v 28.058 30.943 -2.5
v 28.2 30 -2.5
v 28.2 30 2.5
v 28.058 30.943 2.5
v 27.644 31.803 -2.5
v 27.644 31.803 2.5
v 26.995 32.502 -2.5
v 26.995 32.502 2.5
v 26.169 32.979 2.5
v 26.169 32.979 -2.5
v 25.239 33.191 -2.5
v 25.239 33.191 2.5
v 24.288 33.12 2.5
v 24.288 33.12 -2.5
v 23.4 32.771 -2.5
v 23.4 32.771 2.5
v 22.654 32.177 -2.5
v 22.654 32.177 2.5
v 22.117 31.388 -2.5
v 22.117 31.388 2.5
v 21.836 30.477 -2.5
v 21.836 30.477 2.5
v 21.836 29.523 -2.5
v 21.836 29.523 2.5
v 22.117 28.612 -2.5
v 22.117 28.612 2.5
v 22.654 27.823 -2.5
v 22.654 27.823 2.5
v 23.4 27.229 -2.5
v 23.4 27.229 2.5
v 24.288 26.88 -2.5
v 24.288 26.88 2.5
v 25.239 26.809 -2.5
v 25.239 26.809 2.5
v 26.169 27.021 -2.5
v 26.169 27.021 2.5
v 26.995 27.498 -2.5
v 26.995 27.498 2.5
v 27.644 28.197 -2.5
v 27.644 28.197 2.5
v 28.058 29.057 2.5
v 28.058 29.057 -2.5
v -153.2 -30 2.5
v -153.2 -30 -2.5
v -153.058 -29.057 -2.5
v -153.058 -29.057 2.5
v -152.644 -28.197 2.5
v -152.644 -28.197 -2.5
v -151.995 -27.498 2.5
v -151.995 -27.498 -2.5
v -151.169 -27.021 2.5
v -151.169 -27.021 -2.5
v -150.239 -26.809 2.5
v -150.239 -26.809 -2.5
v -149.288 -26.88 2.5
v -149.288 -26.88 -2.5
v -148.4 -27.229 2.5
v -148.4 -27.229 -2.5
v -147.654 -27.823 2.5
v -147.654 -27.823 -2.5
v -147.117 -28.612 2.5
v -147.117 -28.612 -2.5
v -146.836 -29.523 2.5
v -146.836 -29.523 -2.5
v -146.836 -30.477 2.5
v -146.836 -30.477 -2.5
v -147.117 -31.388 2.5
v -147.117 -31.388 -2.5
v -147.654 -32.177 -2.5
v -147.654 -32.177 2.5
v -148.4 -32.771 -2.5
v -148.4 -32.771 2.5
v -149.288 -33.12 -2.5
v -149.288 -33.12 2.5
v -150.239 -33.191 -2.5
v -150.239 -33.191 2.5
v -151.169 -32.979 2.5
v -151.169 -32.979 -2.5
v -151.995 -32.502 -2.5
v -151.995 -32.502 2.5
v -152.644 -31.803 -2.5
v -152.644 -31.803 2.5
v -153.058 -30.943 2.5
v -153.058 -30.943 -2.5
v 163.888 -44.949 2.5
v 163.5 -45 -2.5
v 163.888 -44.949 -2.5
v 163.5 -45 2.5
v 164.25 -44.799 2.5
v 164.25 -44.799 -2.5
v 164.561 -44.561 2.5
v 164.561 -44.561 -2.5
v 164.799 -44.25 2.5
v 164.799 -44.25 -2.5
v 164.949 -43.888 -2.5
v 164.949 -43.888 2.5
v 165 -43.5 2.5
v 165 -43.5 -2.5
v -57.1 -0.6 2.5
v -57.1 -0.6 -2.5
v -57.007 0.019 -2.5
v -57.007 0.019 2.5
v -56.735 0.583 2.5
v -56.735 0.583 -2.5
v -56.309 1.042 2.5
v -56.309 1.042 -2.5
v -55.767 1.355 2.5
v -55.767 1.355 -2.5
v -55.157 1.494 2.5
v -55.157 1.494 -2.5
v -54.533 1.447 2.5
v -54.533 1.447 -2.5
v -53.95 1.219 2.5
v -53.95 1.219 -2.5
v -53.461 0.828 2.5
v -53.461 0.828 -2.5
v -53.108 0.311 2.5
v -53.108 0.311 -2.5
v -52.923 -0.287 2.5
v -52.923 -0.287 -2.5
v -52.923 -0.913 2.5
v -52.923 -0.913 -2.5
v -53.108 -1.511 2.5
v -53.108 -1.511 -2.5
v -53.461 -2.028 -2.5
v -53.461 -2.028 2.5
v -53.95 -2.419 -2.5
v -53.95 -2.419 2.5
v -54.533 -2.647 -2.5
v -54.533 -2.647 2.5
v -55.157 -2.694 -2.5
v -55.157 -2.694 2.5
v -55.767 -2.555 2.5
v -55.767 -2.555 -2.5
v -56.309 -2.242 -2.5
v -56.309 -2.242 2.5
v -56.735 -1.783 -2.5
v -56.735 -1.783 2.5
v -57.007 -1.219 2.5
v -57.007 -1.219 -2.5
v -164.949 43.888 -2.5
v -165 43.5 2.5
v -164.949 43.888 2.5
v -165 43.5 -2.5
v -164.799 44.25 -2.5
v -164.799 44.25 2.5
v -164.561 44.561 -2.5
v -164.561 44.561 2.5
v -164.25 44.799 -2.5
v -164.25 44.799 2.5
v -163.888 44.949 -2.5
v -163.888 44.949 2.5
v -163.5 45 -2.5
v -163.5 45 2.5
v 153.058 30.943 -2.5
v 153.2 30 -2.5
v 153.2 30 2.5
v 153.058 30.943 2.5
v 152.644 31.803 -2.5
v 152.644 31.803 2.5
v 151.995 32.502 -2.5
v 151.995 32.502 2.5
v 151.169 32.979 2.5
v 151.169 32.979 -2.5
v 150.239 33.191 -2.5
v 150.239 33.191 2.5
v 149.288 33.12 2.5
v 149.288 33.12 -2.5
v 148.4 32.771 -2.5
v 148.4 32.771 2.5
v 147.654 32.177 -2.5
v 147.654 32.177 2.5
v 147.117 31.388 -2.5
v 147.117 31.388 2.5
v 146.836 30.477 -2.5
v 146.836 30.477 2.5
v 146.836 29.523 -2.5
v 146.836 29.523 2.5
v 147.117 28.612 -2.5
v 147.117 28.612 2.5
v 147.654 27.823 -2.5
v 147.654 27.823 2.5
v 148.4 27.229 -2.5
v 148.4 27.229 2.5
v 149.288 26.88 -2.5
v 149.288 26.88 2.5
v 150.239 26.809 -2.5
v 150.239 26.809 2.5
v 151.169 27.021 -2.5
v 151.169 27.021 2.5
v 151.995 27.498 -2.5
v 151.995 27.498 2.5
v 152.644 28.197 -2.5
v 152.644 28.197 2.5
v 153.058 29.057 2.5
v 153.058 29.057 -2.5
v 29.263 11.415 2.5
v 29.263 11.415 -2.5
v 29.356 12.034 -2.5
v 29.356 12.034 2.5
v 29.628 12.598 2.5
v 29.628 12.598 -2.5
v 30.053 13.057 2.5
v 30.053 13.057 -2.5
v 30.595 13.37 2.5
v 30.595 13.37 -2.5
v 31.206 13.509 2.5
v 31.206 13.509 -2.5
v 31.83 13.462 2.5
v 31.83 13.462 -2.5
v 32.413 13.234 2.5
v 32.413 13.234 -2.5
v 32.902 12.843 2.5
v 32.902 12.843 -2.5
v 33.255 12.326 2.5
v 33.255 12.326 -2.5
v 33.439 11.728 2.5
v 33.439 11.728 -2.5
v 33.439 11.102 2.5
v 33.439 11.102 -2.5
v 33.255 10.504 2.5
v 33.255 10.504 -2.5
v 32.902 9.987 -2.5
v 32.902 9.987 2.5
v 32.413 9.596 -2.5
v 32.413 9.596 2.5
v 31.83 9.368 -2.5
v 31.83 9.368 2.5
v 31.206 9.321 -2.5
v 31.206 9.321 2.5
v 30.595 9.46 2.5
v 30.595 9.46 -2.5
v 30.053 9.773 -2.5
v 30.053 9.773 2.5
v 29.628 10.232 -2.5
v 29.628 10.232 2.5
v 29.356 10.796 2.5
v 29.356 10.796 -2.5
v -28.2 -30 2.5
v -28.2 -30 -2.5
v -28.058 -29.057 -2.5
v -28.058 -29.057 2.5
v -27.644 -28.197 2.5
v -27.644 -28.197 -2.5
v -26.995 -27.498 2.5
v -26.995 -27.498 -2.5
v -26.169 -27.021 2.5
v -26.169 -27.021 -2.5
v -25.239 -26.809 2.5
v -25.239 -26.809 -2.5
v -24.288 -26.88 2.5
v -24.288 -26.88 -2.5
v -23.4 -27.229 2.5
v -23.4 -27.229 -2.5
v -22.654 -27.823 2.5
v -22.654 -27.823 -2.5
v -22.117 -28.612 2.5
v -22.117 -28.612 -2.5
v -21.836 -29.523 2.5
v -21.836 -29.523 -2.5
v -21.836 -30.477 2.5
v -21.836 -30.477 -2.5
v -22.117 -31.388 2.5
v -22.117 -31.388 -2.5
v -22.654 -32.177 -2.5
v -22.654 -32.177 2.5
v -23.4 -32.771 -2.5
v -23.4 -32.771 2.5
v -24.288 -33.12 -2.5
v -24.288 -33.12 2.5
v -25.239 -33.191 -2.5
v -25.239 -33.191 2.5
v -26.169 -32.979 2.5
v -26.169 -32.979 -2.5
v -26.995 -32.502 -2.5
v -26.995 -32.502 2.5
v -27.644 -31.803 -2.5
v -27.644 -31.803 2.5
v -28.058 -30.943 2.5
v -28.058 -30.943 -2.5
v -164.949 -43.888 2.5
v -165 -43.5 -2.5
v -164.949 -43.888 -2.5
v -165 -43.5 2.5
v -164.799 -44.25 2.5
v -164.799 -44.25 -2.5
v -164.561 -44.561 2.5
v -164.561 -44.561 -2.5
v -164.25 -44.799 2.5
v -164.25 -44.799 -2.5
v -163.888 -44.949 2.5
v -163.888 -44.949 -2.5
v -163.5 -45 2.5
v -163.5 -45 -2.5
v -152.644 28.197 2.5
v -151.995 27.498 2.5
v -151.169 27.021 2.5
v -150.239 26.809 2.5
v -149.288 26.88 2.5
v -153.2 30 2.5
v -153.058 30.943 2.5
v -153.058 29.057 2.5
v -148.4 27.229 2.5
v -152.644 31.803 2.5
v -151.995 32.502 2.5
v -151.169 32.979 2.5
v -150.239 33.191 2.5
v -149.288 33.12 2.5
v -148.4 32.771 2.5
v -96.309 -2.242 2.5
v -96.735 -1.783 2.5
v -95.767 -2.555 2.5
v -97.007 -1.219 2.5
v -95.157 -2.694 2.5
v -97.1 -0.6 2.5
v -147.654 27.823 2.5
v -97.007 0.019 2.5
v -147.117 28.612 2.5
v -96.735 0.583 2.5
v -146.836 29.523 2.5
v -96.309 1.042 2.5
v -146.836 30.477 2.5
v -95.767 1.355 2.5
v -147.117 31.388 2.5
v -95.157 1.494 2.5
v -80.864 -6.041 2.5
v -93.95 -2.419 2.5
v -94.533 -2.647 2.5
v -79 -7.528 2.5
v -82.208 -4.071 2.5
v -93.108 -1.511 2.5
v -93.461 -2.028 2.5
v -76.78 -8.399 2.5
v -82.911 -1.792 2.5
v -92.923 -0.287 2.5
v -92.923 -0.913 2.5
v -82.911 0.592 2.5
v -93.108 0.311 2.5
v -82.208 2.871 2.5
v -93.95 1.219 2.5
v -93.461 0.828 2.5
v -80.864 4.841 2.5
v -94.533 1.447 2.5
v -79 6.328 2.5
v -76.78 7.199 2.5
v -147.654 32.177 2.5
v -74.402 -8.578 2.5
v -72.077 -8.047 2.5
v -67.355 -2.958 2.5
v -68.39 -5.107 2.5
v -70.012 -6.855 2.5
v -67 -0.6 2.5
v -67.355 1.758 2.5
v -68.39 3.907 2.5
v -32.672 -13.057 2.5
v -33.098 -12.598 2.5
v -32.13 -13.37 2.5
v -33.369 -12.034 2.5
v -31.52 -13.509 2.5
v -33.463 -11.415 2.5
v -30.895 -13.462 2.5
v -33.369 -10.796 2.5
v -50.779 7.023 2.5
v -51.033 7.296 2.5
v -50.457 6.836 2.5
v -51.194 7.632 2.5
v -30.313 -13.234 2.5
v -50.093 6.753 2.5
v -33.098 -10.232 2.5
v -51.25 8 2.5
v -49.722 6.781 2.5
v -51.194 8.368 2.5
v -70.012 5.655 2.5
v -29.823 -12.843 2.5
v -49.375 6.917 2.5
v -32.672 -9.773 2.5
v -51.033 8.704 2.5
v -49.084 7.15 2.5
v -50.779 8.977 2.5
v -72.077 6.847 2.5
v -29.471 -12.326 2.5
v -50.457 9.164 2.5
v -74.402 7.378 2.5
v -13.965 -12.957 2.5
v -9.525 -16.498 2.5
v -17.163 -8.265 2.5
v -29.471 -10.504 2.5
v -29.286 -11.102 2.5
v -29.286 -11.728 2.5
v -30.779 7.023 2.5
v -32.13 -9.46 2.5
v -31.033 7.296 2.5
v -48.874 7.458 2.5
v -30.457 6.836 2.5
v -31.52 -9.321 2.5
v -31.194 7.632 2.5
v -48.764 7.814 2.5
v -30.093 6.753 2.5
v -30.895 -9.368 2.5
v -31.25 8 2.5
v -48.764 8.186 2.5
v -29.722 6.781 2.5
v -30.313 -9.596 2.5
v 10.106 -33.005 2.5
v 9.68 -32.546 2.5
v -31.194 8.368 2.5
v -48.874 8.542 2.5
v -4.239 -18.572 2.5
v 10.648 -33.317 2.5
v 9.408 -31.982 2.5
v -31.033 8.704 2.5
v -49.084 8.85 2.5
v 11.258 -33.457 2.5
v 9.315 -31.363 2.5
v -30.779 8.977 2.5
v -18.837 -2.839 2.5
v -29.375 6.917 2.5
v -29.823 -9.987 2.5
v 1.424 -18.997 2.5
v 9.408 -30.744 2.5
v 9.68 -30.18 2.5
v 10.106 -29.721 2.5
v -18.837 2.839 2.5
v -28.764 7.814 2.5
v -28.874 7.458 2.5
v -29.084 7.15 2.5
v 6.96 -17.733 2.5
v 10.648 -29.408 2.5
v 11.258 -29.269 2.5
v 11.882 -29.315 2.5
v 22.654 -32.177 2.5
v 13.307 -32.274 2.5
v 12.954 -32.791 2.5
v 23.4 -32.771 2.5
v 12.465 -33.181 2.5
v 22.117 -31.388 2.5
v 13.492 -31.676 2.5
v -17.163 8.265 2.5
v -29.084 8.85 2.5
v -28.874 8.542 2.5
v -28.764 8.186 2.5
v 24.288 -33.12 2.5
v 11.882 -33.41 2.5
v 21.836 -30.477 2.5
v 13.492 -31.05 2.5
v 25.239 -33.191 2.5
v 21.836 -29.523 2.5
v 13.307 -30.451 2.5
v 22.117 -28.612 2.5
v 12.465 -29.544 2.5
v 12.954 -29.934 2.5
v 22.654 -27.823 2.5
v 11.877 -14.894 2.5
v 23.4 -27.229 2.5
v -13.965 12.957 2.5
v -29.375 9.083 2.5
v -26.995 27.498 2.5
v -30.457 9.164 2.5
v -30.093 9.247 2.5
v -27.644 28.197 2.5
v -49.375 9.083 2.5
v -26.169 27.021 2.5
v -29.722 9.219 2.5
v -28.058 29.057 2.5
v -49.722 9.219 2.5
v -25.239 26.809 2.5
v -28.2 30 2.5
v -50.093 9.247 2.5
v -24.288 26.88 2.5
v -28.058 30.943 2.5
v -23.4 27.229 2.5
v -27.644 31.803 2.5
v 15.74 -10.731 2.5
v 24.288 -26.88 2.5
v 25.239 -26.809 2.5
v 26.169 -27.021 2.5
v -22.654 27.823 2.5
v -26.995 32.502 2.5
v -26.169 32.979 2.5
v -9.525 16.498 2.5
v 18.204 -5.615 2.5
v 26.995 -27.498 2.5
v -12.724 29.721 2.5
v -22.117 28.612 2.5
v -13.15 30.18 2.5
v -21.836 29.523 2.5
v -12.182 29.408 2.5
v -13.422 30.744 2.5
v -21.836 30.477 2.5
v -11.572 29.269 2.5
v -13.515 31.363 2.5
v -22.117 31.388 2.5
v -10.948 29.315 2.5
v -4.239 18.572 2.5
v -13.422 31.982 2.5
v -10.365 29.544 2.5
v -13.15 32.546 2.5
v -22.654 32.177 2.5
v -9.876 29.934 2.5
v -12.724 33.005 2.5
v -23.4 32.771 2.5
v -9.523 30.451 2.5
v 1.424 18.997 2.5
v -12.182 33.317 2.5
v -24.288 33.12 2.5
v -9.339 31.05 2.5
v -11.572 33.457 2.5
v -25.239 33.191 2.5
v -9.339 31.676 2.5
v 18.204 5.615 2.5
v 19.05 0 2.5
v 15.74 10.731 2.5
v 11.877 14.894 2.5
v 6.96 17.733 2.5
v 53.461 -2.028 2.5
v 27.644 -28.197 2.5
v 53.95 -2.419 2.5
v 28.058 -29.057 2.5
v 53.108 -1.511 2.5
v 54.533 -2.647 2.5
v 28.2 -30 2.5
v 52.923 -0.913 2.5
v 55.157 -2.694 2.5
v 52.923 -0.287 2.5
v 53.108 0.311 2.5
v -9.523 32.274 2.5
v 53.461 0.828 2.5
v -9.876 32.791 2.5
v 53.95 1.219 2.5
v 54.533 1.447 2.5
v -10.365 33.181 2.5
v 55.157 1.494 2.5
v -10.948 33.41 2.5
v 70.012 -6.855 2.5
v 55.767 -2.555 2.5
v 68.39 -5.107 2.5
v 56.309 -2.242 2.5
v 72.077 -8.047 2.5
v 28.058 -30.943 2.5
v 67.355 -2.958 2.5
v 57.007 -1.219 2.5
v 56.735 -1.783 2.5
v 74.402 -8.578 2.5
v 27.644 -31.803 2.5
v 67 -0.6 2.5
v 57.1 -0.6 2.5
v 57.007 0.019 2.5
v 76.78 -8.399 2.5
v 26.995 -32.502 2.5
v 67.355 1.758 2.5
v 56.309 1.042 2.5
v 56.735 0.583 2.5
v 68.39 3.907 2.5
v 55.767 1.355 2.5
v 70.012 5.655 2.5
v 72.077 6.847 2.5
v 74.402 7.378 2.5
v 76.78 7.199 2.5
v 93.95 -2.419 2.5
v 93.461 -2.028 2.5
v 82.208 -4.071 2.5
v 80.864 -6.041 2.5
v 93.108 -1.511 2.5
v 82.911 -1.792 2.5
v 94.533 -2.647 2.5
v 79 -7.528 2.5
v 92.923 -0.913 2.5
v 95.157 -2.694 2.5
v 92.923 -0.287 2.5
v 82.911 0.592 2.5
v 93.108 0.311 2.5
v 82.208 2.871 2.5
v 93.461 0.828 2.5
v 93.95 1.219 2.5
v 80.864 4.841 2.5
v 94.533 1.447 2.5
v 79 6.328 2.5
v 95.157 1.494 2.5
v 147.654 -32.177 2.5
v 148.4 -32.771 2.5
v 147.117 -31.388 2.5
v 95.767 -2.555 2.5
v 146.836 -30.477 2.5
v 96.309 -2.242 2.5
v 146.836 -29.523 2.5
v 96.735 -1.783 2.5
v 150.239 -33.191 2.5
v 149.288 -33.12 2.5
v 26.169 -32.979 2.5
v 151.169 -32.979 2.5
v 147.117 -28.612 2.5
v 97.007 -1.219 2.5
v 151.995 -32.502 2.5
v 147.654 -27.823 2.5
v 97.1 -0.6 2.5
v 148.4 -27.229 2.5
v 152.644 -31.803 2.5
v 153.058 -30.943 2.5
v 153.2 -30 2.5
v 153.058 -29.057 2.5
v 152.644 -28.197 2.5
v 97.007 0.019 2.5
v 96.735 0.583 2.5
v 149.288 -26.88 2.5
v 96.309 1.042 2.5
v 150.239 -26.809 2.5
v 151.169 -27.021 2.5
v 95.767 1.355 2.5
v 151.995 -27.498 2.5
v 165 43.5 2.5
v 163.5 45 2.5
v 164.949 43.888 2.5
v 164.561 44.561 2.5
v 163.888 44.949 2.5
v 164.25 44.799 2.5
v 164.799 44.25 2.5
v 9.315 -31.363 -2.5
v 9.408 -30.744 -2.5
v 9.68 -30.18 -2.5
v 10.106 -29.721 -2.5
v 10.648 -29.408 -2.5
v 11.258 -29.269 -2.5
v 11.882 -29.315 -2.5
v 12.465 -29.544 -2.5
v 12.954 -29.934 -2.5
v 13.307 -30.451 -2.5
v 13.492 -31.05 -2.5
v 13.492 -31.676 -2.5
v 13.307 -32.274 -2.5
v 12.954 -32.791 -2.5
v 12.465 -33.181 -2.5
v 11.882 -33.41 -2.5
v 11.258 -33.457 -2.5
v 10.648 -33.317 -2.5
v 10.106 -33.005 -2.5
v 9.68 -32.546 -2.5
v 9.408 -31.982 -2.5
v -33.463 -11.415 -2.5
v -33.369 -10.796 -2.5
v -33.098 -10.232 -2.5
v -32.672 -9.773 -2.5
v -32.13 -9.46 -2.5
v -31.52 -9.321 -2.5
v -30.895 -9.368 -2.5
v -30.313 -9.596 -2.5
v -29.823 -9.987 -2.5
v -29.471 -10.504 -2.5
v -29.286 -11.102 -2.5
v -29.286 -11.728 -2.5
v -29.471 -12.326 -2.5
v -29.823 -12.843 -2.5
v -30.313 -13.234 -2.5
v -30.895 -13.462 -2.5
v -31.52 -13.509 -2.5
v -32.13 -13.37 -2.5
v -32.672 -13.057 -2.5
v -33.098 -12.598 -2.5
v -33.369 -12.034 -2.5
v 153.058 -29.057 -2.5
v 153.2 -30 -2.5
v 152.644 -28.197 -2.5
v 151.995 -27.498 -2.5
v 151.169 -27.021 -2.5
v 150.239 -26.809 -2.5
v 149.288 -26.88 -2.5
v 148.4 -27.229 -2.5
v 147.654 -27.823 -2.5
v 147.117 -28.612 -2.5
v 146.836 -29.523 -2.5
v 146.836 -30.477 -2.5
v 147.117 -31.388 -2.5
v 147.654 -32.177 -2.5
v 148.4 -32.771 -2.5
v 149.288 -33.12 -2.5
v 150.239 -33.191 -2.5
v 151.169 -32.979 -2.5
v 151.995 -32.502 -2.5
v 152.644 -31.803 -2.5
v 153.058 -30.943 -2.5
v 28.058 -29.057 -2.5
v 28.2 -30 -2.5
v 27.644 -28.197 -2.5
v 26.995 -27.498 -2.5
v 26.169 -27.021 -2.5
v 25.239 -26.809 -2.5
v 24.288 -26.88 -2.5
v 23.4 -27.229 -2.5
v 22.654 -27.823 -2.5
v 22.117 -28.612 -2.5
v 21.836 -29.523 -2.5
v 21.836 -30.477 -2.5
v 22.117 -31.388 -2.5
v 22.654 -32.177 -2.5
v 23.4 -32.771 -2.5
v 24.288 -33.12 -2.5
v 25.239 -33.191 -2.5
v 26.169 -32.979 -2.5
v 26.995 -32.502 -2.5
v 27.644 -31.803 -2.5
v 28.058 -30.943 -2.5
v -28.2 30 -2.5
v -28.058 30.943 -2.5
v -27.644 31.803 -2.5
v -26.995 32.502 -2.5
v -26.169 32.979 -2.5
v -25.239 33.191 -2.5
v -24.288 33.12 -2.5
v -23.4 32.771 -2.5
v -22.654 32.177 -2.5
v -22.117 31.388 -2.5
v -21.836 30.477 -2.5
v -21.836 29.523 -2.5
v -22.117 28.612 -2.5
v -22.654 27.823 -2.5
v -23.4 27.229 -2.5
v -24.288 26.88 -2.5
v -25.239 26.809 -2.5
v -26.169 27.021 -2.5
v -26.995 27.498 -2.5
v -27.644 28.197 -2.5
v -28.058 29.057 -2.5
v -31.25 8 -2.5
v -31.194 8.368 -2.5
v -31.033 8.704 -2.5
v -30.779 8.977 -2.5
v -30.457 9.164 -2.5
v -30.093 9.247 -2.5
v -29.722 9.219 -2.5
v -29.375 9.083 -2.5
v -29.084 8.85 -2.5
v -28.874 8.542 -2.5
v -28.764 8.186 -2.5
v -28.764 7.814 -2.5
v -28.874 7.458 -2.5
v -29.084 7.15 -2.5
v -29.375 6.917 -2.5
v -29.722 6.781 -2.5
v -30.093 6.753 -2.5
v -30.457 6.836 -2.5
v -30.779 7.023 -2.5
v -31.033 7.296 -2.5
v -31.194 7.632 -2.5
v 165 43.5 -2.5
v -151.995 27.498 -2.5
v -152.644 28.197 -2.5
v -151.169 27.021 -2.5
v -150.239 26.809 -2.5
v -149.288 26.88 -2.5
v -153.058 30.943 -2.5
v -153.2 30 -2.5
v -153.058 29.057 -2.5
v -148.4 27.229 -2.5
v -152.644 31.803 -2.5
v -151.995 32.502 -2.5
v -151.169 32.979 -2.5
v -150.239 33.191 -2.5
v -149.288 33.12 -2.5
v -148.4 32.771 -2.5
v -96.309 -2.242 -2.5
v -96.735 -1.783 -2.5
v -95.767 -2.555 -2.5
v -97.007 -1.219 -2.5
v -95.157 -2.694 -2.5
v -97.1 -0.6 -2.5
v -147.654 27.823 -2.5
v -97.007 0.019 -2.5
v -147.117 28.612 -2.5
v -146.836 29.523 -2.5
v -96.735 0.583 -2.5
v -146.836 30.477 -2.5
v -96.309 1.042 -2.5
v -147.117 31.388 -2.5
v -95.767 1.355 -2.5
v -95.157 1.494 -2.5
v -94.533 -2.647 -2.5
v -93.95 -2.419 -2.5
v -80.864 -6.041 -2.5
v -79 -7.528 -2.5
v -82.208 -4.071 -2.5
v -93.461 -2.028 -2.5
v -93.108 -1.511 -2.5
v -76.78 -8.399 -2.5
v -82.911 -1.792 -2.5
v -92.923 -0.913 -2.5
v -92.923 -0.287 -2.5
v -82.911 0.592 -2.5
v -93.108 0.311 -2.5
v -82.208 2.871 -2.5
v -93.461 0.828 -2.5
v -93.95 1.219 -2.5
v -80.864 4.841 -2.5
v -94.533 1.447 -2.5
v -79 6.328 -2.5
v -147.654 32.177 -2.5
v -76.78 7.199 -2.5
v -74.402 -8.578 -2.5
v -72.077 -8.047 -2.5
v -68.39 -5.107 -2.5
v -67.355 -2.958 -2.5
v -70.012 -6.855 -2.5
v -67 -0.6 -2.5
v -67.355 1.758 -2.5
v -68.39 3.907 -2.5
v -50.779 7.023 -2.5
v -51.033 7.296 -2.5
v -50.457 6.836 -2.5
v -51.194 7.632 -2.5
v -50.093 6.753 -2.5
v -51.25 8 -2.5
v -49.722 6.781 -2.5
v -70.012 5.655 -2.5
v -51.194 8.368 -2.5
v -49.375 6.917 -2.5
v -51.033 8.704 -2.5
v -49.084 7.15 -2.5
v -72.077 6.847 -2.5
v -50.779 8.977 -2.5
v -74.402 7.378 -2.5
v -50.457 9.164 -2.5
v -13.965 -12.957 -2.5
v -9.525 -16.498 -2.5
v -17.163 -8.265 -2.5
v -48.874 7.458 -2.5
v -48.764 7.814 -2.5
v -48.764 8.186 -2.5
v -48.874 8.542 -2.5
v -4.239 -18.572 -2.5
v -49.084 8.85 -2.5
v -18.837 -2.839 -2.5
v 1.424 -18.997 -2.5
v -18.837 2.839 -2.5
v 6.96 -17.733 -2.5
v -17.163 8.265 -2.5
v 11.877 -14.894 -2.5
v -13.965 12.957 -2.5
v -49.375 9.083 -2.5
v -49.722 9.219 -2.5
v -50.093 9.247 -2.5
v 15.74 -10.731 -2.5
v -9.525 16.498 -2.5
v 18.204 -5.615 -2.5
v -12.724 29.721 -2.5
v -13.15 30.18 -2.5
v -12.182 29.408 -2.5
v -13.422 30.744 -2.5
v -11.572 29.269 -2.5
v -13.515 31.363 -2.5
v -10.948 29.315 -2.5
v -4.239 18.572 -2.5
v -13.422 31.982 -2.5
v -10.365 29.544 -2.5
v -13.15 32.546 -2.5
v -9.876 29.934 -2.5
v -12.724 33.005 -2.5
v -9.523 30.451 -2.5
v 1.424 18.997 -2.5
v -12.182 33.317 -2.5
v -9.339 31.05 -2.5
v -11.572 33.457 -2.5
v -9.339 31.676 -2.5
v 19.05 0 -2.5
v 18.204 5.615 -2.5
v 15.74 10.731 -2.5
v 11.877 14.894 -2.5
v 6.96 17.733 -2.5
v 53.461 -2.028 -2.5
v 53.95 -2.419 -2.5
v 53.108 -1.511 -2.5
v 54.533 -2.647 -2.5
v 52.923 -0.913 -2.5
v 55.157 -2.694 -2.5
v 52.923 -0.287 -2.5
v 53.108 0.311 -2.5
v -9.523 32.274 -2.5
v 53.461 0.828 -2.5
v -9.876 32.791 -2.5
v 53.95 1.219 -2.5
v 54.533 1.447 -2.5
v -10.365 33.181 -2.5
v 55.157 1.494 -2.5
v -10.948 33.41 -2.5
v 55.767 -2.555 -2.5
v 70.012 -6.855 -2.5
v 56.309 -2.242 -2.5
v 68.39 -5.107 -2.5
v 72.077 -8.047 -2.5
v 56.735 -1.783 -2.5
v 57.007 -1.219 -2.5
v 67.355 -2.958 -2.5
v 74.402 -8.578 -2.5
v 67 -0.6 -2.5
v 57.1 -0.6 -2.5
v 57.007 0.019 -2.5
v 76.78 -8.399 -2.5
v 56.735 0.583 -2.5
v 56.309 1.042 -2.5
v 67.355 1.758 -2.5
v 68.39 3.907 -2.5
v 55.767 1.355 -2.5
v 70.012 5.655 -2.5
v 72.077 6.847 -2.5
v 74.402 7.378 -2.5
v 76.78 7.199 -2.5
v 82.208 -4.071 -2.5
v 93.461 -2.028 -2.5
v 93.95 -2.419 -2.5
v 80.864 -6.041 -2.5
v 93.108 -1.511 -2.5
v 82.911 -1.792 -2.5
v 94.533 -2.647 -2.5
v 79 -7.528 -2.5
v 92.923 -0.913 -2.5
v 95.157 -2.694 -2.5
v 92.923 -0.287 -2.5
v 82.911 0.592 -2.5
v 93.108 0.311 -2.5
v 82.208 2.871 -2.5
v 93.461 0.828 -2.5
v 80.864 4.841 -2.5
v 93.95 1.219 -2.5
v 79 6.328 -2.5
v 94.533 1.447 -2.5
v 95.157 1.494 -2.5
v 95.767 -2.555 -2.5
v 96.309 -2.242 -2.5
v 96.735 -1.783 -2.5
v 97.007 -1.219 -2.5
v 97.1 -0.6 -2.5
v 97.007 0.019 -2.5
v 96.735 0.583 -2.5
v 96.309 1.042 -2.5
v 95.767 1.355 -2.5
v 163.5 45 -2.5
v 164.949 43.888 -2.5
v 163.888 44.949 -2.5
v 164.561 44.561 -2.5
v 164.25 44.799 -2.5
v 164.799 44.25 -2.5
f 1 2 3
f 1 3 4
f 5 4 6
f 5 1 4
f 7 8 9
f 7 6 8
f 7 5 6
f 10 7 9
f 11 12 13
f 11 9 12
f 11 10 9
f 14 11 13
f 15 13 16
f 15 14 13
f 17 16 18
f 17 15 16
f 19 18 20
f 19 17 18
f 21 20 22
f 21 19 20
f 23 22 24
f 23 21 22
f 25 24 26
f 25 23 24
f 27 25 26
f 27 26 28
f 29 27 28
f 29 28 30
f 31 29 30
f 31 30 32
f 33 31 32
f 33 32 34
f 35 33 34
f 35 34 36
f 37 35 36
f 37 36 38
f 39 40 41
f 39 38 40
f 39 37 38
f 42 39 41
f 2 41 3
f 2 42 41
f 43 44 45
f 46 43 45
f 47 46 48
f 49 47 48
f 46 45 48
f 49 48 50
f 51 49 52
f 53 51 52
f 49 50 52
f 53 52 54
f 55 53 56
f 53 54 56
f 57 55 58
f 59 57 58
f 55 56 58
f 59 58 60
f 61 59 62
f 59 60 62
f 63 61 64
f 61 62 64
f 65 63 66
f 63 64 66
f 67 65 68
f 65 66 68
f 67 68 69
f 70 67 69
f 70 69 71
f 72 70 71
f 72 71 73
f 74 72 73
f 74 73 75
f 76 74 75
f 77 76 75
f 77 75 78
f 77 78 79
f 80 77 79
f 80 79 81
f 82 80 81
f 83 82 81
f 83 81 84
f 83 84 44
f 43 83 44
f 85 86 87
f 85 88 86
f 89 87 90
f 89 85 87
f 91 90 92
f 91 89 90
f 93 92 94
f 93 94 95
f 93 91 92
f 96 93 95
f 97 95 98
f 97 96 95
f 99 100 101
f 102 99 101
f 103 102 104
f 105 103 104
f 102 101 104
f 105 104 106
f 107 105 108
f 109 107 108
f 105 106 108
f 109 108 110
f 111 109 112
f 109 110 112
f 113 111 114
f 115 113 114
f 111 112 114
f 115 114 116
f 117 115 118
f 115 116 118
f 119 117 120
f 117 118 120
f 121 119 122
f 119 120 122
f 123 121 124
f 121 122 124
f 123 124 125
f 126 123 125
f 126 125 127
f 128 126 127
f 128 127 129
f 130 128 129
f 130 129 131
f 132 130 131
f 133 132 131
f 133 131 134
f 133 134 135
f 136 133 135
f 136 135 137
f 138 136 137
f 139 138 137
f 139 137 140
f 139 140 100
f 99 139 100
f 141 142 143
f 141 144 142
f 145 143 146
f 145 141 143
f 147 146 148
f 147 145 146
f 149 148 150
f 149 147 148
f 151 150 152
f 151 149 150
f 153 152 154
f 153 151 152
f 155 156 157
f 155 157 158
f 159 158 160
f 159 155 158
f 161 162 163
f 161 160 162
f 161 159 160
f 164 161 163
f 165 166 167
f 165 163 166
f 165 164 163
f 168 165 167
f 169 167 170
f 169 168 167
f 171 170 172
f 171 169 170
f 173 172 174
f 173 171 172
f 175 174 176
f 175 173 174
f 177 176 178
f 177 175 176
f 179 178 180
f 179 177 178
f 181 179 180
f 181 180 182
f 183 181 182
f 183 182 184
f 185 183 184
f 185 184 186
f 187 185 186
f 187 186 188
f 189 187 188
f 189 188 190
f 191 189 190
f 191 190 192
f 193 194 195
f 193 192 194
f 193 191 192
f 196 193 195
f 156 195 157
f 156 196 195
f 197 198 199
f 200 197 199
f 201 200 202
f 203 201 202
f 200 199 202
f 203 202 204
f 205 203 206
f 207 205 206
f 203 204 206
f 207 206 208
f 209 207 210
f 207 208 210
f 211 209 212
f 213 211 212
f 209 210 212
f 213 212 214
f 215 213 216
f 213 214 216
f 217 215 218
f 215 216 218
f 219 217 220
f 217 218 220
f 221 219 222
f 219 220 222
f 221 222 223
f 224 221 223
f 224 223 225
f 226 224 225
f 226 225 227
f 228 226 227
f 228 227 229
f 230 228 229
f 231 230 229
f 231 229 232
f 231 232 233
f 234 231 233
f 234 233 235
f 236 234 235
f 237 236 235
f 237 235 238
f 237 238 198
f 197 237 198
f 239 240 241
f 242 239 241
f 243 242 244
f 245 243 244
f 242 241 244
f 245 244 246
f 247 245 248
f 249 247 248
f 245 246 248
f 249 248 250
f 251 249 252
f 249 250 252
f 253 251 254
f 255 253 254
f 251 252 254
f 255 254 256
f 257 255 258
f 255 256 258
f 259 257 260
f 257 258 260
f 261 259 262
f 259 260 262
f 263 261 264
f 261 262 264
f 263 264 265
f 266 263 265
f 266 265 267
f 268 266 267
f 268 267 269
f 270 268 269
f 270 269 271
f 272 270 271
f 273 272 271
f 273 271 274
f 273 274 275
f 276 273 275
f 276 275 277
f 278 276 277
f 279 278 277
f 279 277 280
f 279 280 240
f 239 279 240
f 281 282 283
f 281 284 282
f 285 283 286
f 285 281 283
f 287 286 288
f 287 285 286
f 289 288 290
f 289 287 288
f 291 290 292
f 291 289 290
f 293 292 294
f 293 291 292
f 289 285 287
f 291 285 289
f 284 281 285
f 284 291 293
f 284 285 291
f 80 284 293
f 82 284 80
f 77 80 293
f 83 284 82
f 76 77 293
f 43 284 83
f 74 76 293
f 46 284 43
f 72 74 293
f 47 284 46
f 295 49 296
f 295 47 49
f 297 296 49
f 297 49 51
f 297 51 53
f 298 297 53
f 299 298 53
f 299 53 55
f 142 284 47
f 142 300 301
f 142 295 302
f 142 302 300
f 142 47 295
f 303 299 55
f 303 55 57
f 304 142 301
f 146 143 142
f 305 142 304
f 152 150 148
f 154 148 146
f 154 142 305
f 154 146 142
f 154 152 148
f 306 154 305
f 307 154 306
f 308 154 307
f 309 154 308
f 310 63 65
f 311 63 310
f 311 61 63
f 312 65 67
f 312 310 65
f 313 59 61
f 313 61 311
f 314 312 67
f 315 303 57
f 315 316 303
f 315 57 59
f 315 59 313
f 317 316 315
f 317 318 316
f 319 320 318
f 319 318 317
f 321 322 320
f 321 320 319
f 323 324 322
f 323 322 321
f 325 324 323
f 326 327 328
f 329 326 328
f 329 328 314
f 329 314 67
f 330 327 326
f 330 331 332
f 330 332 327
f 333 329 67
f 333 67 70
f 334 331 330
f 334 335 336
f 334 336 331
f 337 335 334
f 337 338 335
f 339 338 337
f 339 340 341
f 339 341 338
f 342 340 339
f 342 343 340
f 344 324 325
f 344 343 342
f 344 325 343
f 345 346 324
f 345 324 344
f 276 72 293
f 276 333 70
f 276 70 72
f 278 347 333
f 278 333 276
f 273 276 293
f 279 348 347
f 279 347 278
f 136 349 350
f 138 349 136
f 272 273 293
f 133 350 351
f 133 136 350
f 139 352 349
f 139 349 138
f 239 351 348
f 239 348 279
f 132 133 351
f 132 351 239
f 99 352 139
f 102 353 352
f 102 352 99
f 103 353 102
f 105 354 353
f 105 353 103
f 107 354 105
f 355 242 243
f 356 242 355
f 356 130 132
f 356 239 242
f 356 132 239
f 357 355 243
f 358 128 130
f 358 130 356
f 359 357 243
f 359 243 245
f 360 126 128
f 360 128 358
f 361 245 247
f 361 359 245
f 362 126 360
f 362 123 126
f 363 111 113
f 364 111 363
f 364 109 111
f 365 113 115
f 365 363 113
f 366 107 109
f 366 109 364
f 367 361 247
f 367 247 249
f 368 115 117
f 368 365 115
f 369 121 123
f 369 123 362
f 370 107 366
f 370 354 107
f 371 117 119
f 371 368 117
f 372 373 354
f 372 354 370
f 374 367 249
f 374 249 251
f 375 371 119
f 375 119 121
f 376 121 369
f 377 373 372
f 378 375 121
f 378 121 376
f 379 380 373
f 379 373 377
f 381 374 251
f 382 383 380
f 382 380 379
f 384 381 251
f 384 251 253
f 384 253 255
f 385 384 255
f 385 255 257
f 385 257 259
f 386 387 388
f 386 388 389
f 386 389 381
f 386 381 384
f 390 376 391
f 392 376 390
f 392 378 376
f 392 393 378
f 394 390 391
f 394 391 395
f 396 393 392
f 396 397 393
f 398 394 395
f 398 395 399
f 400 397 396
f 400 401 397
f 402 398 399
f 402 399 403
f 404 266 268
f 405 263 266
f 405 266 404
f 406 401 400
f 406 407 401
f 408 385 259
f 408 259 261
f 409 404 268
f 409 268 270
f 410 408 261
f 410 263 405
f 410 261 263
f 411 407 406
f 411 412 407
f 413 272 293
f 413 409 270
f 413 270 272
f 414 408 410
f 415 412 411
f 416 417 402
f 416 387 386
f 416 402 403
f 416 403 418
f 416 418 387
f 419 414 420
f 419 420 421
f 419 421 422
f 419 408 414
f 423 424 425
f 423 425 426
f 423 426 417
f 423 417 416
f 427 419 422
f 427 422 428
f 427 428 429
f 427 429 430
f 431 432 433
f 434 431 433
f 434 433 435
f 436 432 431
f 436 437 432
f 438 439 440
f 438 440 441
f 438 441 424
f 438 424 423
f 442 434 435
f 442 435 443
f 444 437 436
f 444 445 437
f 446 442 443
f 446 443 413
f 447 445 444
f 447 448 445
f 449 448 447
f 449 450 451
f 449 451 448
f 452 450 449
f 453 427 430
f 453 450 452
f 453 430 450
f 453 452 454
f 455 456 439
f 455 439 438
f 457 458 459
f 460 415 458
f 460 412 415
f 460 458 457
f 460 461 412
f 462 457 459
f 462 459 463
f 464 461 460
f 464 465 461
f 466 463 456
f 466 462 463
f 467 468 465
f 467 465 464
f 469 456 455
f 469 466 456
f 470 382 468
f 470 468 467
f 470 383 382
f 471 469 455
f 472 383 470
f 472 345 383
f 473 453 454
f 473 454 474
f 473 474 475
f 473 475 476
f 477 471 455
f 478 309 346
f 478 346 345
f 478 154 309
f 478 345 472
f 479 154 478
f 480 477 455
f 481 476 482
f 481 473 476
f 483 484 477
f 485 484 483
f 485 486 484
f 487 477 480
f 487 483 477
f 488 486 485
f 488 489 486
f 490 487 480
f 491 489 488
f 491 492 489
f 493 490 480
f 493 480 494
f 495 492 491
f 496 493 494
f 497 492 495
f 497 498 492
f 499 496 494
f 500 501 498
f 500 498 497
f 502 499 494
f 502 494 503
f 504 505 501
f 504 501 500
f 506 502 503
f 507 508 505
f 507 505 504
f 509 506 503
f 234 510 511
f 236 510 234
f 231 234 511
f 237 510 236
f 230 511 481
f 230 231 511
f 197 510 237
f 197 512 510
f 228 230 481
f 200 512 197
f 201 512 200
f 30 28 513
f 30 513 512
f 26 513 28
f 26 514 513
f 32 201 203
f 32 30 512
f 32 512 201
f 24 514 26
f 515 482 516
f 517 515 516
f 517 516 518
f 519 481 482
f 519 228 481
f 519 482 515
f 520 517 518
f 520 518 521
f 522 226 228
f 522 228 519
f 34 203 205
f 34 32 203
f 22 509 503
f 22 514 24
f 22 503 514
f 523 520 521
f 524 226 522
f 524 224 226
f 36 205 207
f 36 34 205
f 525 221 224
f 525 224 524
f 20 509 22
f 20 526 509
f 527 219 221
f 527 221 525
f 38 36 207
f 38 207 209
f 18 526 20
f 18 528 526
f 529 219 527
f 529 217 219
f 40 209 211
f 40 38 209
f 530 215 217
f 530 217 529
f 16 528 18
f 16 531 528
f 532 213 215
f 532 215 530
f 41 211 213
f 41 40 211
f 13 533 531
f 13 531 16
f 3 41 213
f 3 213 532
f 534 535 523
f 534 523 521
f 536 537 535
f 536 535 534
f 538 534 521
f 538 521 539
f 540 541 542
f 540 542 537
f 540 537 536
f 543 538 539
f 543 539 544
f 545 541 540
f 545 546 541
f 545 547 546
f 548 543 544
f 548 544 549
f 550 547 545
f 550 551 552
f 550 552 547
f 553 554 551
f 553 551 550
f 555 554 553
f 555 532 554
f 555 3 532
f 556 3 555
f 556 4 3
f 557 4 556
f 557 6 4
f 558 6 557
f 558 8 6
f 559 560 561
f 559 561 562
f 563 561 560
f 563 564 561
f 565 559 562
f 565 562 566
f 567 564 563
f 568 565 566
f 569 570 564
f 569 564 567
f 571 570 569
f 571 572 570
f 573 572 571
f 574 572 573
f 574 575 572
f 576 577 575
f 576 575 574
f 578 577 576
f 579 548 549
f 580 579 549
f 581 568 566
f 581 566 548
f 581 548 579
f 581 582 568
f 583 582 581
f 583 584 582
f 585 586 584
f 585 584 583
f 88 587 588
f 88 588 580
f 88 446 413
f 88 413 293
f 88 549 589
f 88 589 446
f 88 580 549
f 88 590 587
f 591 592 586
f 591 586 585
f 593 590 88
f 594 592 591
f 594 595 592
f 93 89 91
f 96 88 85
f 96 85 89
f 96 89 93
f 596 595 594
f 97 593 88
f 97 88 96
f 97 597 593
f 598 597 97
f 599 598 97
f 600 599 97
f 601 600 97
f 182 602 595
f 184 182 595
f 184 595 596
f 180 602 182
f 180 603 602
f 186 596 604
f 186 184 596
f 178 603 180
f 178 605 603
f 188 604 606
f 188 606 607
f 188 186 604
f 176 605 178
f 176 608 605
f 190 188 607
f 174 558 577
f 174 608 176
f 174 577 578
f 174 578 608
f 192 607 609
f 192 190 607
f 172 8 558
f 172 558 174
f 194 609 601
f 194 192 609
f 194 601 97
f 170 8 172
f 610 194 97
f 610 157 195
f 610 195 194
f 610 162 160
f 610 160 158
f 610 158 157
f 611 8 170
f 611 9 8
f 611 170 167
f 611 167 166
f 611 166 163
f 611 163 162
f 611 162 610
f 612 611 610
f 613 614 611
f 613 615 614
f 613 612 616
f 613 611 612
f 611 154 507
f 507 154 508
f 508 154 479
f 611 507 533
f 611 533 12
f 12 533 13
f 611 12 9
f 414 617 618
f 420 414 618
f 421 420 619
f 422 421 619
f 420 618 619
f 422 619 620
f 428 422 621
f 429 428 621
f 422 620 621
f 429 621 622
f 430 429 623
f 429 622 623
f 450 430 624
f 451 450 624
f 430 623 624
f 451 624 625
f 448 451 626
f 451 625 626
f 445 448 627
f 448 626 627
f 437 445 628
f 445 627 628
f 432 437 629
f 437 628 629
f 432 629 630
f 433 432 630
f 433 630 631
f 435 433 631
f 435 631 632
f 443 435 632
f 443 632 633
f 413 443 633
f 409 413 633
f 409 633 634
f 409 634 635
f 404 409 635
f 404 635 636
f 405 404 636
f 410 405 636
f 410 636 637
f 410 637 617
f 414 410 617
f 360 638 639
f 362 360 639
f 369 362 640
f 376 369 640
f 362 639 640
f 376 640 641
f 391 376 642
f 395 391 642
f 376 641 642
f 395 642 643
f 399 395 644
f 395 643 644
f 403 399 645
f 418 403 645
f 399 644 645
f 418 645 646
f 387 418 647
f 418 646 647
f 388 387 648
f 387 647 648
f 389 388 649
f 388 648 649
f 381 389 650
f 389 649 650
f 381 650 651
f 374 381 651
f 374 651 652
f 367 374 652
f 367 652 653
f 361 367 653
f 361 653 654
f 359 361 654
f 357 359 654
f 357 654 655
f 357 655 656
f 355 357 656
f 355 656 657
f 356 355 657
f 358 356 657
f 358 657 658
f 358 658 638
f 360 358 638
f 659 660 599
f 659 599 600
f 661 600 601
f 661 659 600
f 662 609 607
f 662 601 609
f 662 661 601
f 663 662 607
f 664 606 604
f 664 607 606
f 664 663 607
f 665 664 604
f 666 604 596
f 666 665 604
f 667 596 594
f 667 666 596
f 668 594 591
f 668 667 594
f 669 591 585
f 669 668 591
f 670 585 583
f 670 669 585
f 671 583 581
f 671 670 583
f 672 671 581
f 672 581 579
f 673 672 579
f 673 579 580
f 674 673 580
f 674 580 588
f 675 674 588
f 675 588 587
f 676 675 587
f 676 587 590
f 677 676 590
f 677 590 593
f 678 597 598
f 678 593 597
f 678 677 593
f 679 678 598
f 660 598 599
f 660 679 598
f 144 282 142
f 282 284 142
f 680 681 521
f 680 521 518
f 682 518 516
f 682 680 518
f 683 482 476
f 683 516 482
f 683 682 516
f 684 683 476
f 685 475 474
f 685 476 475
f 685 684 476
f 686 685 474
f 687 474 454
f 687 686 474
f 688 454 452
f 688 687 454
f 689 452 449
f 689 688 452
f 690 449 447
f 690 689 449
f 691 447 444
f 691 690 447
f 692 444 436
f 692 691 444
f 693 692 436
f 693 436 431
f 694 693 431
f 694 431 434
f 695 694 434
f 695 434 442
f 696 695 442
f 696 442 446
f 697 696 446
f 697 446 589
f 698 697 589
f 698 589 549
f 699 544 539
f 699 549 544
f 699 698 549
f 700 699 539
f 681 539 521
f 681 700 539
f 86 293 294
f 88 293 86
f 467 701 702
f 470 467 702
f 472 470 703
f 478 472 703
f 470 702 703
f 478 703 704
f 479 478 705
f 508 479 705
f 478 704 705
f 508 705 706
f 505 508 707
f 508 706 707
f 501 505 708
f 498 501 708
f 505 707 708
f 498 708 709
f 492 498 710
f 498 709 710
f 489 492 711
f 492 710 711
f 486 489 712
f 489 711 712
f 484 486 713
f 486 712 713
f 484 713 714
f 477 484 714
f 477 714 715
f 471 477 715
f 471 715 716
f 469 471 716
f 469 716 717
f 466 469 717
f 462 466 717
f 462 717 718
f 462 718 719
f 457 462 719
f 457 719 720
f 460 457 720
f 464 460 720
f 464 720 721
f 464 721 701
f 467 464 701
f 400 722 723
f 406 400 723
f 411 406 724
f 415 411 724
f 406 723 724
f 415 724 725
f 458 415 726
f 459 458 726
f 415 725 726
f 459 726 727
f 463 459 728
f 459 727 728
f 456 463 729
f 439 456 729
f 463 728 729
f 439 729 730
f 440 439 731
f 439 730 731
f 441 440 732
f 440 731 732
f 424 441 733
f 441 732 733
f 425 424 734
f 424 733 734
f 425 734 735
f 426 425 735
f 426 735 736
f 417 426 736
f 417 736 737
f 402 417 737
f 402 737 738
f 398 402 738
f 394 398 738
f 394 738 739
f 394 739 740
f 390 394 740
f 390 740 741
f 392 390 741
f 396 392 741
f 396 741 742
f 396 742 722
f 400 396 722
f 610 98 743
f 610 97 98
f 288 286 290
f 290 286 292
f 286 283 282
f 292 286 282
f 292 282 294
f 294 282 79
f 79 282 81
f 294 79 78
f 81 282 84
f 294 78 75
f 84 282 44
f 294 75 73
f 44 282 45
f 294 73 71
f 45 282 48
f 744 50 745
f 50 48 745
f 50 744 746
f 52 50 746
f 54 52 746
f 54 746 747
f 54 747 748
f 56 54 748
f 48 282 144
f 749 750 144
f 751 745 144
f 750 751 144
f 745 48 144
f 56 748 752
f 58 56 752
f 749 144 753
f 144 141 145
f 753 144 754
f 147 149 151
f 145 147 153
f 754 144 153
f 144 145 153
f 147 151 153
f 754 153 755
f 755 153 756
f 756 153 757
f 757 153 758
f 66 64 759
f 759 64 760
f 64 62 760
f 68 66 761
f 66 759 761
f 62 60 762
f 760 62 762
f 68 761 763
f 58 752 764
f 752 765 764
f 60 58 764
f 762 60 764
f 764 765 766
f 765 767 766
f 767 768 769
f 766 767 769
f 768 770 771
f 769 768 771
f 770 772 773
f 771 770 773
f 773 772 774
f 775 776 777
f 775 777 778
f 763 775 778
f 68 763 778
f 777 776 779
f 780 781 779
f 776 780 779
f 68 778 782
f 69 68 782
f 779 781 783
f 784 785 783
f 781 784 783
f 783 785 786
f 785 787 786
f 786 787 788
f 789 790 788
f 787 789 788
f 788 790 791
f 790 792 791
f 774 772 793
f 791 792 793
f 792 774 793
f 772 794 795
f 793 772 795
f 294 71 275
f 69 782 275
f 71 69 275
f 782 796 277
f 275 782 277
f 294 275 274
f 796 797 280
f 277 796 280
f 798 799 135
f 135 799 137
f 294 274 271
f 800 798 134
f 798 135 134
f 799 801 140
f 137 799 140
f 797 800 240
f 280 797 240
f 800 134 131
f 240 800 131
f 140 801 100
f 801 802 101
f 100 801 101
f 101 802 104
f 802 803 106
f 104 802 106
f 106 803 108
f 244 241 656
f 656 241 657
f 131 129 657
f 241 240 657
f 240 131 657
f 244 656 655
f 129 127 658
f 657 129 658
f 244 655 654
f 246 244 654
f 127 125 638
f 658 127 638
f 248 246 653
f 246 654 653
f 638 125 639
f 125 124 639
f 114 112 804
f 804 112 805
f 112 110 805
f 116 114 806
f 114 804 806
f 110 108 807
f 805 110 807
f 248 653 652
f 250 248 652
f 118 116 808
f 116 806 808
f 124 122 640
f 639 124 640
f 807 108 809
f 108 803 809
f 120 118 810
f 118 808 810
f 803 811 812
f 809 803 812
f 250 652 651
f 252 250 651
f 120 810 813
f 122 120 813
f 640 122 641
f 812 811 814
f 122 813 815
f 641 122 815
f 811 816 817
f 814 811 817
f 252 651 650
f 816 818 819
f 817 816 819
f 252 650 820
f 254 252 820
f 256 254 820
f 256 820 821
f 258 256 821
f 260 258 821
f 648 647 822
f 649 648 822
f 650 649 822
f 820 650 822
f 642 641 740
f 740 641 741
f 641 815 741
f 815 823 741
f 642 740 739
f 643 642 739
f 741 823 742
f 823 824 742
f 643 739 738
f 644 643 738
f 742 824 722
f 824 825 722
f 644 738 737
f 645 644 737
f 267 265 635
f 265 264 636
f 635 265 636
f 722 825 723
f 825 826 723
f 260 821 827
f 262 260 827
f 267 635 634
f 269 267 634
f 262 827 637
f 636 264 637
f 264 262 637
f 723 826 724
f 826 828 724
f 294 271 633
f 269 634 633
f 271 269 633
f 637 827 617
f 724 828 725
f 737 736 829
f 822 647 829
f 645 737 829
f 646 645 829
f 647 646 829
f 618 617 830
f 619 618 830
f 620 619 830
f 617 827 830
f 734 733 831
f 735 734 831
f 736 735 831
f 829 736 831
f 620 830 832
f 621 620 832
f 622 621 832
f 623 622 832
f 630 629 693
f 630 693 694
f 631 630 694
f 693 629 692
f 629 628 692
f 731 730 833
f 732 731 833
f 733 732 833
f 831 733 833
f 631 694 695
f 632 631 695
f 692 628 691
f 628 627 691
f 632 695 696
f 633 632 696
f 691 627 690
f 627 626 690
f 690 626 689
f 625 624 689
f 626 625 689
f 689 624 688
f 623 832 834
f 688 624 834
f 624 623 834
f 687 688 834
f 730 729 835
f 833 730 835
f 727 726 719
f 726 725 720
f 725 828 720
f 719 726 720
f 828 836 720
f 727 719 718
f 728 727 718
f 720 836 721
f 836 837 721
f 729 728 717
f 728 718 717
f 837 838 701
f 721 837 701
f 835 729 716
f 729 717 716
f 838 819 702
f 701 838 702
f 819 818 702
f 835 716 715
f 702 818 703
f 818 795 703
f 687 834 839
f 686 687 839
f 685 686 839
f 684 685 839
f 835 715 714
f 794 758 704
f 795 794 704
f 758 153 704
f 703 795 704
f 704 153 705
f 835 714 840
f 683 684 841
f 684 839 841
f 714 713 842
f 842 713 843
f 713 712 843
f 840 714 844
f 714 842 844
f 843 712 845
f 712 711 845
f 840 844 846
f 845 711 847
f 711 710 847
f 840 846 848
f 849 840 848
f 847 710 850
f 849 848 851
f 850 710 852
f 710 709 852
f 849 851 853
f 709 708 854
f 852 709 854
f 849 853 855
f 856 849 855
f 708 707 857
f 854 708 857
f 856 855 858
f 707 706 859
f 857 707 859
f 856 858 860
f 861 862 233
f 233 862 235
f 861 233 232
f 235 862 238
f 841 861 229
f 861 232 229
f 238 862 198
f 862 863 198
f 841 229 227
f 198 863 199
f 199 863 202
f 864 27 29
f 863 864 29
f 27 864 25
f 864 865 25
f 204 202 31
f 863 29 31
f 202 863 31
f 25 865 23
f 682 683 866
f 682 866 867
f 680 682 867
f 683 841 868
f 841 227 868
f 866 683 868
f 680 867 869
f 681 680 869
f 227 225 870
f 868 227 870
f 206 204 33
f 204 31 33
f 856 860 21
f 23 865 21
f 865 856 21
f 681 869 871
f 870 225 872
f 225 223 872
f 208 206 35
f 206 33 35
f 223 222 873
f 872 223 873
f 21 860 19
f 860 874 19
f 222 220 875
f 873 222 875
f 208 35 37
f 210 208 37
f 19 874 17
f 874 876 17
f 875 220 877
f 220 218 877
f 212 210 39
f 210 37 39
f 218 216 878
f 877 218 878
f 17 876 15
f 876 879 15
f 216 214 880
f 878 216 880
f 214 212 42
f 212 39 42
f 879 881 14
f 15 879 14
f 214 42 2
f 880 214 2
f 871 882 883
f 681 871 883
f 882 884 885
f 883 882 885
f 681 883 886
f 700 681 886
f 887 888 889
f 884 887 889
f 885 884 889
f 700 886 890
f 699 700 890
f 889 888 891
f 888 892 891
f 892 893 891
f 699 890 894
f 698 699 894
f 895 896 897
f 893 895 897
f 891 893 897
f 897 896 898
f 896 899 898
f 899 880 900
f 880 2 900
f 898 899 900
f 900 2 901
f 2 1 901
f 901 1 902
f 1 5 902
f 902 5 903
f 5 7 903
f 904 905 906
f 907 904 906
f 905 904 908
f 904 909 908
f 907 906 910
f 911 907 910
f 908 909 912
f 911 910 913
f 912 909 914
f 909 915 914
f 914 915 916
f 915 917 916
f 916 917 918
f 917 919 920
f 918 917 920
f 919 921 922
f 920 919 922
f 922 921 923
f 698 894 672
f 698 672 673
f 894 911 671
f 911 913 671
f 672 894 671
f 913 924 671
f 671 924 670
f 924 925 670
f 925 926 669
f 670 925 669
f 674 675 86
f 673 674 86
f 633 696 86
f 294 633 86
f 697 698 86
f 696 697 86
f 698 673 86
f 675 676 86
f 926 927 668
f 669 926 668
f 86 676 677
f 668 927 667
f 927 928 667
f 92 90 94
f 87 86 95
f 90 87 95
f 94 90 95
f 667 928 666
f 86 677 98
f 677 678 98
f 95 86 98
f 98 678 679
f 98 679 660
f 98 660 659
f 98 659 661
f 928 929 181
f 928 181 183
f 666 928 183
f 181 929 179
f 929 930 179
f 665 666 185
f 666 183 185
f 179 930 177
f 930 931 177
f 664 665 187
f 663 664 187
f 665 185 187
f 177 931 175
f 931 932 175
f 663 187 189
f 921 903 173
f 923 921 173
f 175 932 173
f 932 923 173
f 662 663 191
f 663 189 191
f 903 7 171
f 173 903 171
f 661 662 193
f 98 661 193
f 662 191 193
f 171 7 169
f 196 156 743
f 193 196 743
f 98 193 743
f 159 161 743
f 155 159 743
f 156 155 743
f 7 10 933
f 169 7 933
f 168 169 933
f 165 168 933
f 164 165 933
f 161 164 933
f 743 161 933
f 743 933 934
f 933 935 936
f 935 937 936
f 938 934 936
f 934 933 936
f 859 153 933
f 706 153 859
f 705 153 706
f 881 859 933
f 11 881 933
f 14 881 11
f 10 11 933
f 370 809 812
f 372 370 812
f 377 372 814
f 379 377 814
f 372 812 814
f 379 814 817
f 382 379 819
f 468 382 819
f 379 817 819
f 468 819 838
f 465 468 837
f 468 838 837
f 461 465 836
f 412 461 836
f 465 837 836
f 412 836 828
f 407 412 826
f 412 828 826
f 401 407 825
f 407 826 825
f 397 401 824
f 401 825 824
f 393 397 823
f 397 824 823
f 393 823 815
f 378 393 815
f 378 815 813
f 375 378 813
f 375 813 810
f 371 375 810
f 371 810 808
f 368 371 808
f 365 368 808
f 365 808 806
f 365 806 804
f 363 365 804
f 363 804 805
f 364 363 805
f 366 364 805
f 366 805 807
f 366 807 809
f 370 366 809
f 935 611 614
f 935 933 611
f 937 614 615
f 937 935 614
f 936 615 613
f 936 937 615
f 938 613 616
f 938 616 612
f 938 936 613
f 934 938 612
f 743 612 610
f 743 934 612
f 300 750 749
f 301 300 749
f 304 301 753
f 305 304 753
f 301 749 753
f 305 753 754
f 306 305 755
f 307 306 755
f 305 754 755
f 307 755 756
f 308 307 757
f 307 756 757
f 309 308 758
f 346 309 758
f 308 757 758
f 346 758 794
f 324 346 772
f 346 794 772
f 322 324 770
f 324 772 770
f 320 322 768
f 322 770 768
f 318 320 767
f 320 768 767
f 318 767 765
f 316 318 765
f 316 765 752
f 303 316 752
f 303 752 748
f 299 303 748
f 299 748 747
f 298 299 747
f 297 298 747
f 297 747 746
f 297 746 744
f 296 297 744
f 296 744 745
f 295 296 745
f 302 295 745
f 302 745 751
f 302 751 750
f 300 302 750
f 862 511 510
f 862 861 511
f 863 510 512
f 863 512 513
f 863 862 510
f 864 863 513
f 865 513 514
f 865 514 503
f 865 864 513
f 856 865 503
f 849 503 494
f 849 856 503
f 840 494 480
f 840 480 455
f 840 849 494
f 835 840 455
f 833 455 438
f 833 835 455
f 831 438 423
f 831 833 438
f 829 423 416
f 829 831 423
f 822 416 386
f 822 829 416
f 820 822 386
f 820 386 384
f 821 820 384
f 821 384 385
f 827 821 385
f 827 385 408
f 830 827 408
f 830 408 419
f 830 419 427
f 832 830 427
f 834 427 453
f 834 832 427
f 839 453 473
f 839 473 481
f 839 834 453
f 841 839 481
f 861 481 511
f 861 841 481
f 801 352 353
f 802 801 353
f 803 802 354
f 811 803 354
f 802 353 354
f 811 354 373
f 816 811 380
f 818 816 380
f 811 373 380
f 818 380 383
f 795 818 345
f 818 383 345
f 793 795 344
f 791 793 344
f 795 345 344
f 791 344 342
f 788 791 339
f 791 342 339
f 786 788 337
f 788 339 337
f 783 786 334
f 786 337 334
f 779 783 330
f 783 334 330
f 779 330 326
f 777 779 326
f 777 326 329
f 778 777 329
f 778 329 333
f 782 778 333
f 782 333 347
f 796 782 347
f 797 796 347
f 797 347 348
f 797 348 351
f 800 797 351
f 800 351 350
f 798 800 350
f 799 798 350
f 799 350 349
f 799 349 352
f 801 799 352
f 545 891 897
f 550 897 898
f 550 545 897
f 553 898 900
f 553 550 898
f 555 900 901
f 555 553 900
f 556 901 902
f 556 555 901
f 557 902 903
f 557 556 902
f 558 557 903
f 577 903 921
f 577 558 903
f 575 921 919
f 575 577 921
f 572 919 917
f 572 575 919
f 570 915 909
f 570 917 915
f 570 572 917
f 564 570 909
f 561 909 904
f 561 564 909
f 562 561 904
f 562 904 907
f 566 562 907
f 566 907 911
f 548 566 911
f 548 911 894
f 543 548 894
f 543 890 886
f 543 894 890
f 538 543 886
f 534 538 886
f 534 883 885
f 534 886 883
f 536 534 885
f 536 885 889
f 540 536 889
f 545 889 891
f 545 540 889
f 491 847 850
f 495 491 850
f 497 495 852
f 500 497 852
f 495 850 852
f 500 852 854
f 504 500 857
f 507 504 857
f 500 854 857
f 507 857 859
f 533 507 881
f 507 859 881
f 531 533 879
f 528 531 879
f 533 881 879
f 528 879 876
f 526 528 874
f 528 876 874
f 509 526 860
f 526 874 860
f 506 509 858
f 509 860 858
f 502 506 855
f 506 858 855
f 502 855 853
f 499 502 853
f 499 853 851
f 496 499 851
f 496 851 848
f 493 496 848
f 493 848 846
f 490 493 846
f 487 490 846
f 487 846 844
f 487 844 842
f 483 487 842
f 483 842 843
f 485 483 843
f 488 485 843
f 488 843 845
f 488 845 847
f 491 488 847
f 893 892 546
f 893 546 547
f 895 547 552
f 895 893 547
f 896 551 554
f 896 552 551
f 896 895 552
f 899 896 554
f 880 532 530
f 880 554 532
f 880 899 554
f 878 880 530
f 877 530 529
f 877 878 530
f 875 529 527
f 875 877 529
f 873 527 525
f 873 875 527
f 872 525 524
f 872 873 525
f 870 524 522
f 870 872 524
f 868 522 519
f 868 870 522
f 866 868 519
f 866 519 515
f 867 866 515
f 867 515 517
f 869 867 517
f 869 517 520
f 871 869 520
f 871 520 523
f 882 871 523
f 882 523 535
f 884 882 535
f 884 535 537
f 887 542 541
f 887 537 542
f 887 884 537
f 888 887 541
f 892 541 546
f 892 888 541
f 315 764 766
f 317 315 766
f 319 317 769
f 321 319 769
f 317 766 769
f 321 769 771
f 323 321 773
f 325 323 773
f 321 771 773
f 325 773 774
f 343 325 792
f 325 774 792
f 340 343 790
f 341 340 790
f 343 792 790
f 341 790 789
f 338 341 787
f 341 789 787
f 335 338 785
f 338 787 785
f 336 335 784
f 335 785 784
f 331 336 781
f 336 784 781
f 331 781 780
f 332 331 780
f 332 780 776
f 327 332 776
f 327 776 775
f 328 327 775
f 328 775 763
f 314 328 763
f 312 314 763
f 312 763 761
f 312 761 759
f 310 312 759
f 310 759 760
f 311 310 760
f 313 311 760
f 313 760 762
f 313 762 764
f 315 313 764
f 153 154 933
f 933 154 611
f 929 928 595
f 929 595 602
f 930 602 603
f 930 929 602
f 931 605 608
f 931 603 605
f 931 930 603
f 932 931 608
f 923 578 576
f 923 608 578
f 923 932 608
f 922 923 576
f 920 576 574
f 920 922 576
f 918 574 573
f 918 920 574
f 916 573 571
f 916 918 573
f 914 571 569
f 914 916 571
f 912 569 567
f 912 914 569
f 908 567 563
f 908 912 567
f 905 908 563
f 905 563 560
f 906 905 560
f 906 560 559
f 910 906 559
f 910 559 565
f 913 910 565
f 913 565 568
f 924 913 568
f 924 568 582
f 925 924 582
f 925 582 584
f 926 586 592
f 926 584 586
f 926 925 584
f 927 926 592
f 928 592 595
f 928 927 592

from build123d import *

# Parameters (mm, degrees)
SKETCH1_W             = 330
SKETCH1_H             = 90
SKETCH1_R             = 19.05
BOSS_EXTRUDE1_DEPTH   = 2.5
M6_CLEARANCE_HOLE1_D  = 6.4
SKETCH3_R             = 8
CUT_EXTRUDE2_DEPTH    = 6
M5X0_8_TAPPED_HOLE1_D = 4.2
M5X0_8_TAPPED_HOLE3_D = 4.2
FILLET1_R             = 1.5
M3X0_5_TAPPED_HOLE1_D = 2.5


with BuildPart() as part:
    # Sketch1 → Boss-Extrude1 (new body, symmetric)
    with BuildSketch(Plane.XY):
        Rectangle(SKETCH1_W, SKETCH1_H)
        Circle(SKETCH1_R, mode=Mode.SUBTRACT)
    extrude(amount=BOSS_EXTRUDE1_DEPTH, both=True)

    # M6 Clearance Hole1 (through all)
    with Locations(Plane.XY.offset(2.5)):
        with Locations((-150, 30), (-25, 30), (-25, -30), (-150, -30)):
            m6_clearance_hole1 = Hole(M6_CLEARANCE_HOLE1_D / 2)

    # Mirror2: M6 Clearance Hole1 across plane
    add(m6_clearance_hole1.mirror(Plane(origin=(0, 0, 0), x_dir=(0, 0, 1), z_dir=(1, 0, 0))), mode=Mode.SUBTRACT)

    # Sketch3 → Cut-Extrude2 (cut, through all)
    with BuildSketch(Plane.XY.offset(2.5)):
        with Locations((-75, -0.6)):
            Circle(SKETCH3_R)
    cut_extrude2 = extrude(amount=-CUT_EXTRUDE2_DEPTH, mode=Mode.SUBTRACT)

    # M5x0.8 Tapped Hole1 (through all)
    with Locations(Plane.XY.offset(2.5)):
        with Locations((-95, -0.6), (-55, -0.6)):
            m5x0_8_tapped_hole1 = Hole(M5X0_8_TAPPED_HOLE1_D / 2)

    # Mirror1: Cut-Extrude2, M5x0.8 Tapped Hole1 across plane
    add(cut_extrude2.mirror(Plane(origin=(0, 0, 0), x_dir=(0, 0, 1), z_dir=(1, 0, 0))), mode=Mode.SUBTRACT)
    add(m5x0_8_tapped_hole1.mirror(Plane(origin=(0, 0, 0), x_dir=(0, 0, 1), z_dir=(1, 0, 0))), mode=Mode.SUBTRACT)

    # M5x0.8 Tapped Hole3 (through all)
    with Locations(Plane.XY.offset(2.5)):
        with Locations((-11.415072797, 31.362654751), (11.415072797, -31.362654751), (-31.362654751, -11.415072797), (31.362654751, 11.415072797)):
            Hole(M5X0_8_TAPPED_HOLE3_D / 2)

    # Fillet1
    fillet1_edges = [part.edges().sort_by_distance(p)[0] for p in [
        (-165, 45, 0),
        (165, 45, 0),
        (165, -45, 0),
        (-165, -45, 0),
    ]]
    fillet(fillet1_edges, radius=FILLET1_R)

    # M3x0.5 Tapped Hole1 (through all)
    with Locations(Plane.XY.offset(2.5)):
        with Locations((-50, 8), (-30, 8)):
            Hole(M3X0_5_TAPPED_HOLE1_D / 2)


solid = part.part
